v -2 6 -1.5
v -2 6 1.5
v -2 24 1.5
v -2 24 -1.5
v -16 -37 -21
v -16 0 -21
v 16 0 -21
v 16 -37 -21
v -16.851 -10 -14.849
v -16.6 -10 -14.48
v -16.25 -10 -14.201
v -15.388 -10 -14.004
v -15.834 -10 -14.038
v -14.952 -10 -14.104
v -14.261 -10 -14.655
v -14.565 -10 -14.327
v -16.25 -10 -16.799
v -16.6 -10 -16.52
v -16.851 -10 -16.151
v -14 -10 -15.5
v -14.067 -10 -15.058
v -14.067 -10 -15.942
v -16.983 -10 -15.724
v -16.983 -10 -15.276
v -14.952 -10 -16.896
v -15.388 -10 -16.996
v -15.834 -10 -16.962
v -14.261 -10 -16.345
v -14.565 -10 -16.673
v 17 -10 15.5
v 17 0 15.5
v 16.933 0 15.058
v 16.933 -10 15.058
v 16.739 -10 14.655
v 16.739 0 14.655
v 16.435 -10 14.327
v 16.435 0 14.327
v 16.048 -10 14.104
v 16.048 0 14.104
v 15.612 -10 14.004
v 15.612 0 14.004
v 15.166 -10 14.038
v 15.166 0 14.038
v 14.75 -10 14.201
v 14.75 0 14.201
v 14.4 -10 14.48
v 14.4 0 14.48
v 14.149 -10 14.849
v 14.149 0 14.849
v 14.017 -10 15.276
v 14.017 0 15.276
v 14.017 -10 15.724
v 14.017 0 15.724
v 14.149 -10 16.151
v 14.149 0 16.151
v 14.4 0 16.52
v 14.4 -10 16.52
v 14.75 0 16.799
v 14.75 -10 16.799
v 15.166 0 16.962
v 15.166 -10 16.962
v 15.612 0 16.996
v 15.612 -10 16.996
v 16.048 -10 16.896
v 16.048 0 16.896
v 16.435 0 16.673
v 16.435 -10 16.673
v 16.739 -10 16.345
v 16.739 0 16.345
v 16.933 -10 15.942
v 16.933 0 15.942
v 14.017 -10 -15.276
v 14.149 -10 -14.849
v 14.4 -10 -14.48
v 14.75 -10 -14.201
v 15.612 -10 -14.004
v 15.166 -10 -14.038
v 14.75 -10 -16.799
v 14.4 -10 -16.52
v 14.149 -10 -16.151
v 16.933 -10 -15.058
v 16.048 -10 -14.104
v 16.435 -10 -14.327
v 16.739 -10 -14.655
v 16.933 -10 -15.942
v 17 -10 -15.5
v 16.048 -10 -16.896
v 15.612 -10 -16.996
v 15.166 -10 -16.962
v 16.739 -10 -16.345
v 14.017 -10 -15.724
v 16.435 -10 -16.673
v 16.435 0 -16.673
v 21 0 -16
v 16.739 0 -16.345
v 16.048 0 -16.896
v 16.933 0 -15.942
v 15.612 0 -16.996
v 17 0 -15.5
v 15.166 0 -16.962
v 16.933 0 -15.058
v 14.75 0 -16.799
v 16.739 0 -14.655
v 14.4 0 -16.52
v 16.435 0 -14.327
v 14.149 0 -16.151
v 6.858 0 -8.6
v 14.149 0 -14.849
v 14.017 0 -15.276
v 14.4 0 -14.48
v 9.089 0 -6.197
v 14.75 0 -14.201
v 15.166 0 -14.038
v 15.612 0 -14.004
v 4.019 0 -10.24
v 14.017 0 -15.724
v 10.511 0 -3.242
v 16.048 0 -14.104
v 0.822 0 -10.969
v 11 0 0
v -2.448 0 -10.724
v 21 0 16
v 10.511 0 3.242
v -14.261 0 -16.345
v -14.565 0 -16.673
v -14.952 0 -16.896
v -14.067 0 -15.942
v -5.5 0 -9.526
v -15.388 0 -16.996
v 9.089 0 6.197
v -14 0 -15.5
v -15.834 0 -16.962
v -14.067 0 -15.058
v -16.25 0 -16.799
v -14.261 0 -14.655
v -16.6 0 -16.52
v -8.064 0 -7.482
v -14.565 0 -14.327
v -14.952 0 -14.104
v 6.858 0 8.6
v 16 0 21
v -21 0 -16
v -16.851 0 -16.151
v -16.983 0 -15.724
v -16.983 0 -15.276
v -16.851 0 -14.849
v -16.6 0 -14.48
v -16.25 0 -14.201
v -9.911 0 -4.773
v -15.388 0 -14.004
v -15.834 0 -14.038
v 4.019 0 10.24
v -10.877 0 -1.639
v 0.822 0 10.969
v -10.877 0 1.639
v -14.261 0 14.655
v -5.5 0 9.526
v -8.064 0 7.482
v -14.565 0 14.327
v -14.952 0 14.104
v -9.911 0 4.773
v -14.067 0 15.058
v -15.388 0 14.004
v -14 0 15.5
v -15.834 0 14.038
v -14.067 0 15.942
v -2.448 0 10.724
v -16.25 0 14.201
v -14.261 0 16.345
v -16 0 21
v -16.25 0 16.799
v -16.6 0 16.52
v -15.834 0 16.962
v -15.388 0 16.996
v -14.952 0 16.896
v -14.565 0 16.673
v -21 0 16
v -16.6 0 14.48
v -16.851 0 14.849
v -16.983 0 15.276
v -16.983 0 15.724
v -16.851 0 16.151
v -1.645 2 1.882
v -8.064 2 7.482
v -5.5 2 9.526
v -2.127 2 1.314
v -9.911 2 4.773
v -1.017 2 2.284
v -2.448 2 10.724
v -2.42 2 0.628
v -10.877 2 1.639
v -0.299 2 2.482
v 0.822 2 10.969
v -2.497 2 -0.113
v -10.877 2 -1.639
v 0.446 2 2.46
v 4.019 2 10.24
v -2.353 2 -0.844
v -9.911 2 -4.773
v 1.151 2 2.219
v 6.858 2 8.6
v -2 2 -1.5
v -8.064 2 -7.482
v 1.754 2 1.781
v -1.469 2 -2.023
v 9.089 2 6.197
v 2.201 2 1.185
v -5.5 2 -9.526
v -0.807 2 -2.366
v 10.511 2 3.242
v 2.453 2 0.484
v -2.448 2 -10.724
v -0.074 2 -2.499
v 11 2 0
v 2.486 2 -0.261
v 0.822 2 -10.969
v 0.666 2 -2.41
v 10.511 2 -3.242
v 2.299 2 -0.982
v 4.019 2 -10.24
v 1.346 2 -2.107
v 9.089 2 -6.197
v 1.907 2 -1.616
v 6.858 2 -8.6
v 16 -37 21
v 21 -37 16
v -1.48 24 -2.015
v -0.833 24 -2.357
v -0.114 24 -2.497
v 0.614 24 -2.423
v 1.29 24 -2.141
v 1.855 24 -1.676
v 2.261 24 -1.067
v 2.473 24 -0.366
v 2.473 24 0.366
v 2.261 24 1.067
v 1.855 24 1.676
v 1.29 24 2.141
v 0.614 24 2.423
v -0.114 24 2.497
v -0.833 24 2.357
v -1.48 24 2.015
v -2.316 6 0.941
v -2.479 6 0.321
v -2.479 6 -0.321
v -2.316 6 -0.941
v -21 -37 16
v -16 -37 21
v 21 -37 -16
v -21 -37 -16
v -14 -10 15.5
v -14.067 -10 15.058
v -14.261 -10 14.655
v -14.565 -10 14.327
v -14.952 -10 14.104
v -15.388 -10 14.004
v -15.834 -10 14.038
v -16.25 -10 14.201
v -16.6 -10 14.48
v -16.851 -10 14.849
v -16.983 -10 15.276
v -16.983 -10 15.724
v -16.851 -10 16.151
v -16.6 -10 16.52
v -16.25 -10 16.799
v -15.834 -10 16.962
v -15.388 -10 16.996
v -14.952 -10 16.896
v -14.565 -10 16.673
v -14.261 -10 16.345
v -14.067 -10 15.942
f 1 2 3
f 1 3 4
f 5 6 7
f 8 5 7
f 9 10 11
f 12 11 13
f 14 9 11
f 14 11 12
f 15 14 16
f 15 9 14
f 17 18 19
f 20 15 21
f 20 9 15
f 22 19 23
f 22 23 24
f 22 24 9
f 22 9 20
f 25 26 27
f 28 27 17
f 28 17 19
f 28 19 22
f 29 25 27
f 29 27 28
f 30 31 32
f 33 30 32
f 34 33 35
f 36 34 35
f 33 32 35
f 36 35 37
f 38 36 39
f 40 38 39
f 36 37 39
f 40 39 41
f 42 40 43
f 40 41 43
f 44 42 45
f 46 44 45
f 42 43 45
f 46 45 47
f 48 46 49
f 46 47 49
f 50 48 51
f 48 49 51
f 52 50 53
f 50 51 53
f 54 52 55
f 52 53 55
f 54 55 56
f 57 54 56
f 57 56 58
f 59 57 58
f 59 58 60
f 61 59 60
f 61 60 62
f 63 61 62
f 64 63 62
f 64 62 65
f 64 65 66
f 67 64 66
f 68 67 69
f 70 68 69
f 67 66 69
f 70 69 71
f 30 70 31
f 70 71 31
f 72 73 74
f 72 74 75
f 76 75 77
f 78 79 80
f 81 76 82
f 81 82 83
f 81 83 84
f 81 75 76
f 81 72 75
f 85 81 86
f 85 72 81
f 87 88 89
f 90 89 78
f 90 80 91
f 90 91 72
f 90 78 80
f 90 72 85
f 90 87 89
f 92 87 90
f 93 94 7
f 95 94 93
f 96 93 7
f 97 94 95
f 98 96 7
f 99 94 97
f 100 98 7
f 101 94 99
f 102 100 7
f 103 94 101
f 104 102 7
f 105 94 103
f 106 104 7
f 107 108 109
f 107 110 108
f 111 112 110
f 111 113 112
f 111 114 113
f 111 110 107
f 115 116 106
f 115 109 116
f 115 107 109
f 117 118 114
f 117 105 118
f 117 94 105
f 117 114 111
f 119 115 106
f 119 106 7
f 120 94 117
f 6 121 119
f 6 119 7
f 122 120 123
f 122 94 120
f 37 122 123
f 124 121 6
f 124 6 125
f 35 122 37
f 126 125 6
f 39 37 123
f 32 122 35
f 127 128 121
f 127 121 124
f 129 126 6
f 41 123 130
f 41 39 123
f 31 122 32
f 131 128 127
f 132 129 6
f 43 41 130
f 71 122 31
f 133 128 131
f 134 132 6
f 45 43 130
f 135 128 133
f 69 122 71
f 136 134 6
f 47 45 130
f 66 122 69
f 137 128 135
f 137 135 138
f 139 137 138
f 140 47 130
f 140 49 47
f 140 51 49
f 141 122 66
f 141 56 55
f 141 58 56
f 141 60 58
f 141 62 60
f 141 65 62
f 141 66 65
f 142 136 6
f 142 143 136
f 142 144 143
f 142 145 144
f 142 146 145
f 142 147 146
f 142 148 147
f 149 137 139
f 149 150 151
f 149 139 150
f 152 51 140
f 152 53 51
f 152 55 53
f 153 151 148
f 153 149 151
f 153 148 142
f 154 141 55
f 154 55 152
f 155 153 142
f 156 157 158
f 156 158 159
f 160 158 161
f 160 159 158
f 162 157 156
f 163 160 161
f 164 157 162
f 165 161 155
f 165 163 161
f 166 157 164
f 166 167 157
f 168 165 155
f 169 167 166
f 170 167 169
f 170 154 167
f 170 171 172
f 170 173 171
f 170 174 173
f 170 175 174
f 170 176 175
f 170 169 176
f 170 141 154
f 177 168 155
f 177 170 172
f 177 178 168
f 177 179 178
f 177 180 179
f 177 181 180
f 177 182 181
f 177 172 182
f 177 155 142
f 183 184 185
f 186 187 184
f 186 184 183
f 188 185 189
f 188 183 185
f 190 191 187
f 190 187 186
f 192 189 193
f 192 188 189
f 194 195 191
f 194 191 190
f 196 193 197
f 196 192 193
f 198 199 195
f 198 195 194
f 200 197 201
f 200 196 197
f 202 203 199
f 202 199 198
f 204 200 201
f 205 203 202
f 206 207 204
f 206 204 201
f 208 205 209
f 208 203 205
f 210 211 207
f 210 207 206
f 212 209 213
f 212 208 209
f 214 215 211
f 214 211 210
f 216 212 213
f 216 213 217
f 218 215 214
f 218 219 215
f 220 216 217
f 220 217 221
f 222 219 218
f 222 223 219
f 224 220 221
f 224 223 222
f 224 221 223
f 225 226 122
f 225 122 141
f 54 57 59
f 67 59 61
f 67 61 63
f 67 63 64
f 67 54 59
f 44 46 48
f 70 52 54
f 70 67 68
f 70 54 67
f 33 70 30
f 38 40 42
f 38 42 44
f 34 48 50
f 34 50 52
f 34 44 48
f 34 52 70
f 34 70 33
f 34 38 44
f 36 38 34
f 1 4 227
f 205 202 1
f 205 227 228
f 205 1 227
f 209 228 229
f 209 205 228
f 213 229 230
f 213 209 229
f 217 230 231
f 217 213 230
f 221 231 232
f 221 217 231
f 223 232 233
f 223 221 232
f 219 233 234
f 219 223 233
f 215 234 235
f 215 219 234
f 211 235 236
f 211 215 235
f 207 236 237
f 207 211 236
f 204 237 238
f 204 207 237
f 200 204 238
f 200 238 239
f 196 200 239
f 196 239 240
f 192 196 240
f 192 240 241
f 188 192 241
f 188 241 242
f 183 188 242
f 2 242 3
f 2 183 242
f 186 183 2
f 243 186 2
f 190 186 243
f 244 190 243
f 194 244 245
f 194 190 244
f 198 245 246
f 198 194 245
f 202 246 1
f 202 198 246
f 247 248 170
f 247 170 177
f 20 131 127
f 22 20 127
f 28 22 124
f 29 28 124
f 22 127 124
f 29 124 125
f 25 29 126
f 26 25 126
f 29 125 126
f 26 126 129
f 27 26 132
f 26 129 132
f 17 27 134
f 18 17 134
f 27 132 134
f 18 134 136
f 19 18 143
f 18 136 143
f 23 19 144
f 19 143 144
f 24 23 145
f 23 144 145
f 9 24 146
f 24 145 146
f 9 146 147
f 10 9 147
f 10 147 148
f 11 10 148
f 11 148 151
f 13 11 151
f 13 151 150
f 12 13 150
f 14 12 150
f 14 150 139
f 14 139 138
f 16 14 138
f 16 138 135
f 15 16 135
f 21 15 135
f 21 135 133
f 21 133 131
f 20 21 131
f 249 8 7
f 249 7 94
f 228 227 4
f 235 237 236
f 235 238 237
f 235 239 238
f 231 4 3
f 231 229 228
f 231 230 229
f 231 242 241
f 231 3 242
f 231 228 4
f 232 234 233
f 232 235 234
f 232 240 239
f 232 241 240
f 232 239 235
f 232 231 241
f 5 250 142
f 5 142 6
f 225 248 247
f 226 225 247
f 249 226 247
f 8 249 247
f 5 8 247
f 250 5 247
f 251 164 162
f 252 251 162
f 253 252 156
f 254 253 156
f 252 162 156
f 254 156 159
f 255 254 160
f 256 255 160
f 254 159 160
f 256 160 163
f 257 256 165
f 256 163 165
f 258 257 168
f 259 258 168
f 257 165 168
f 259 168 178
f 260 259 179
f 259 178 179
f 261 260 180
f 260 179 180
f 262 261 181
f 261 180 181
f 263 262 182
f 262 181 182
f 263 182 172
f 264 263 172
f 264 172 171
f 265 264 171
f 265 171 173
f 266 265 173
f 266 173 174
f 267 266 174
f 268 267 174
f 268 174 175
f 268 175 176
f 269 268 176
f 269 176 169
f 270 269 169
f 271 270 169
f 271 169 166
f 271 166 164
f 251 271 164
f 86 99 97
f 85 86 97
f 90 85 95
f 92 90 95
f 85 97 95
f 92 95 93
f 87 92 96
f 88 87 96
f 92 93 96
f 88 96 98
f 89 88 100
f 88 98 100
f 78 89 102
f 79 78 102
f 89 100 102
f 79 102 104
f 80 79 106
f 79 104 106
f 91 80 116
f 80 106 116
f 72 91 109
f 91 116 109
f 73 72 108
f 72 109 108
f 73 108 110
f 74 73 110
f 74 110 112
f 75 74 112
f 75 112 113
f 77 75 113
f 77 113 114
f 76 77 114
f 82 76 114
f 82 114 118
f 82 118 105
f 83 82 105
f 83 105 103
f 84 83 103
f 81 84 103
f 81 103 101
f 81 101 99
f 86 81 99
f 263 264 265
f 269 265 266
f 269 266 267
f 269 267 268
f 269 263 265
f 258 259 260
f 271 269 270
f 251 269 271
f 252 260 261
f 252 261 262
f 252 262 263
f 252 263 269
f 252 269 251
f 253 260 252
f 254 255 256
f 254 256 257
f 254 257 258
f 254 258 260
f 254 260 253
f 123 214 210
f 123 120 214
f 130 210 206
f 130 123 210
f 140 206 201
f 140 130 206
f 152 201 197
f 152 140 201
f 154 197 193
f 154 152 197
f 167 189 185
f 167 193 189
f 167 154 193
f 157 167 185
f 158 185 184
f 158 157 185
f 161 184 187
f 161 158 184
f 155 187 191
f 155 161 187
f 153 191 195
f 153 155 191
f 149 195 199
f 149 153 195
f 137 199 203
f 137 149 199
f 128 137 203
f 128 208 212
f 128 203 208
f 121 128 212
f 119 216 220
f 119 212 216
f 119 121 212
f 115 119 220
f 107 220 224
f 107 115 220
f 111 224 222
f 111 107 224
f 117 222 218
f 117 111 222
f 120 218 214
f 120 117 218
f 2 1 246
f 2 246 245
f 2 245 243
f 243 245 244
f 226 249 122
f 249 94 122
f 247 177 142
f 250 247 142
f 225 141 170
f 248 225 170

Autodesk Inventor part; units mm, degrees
ref_plane "YZ Plane" through (0, 0, 0) normal (1, 0, 0) x (0, 1, 0)
ref_plane "XZ Plane" through (0, 0, 0) normal (0, 1, 0) x (-1, 0, 0)
ref_plane "XY Plane" through (0, 0, 0) normal (0, 0, 1) x (1, 0, 0)
sketch "스케치1" plane through (0, 0, 0) normal (0, 1, 0) x (-1, 0, 0)
  line L0 (-16, 21) -> (16, 21)
  line L1 (21, 16) -> (21, -16)
  line L2 (16, -21) -> (-16, -21)
  line L3 (-21, -16) -> (-21, 16)
  line L4 (-21, 21) -> (21, -21) construction
  line L5 (21, 21) -> (-21, -21) construction
  line L6 (16, 21) -> (21, 16)
  line L7 (21, -16) -> (16, -21)
  line L8 (-16, -21) -> (-21, -16)
  line L9 (-21, 16) -> (-16, 21)
  point P0 (0, 0)
  dimension "d0" = 42
  dimension "d1" = 42
  dimension "d2" = 5
  dimension "d3" = 5
  dimension "d4" = 5
  dimension "d5" = 5
  dimension "d6" = 5
  dimension "d7" = 5
  dimension "d8" = 5
  dimension "d9" = 5
extrude "돌출1" add sketch "스케치1" against normal blind 37
sketch "스케치2" plane through (0, 0, 0) normal (0, 1, 0) x (1, 0, 0)
  circle A0 centre (-15.5, -15.5) radius 1.5
  line L0 (0, 0) -> (-5.5004, 0) construction
  line L1 (0, 0) -> (0, 5.7427) construction
  circle A1 centre (-15.5, 15.5) radius 1.5
  circle A2 centre (15.5, -15.5) radius 1.5
  circle A3 centre (15.5, 15.5) radius 1.5
  dimension "d12" = 3
  dimension "d13" = 31
  dimension "d14" = 31
extrude "돌출2" cut sketch "스케치2" against normal blind 10
sketch "스케치3" plane through (0, 0, 0) normal (0, 1, 0) x (1, 0, 0)
  circle A0 centre (0, 0) radius 11
  dimension "d17" = 22
extrude "돌출3" add sketch "스케치3" along normal blind 2
sketch "스케치4" plane through (0, 2, 0) normal (0, 1, 0) x (1, 0, 0)
  circle A0 centre (0, 0) radius 2.5
  line L0 (-2, -3.7589) -> (-2, 6.4181)
  point P0 (-2, 1.5)
  point P1 (-2, -1.5)
  dimension "d20" = 5
  dimension "d23" = 2
extrude "돌출4" add sketch "스케치4" along normal blind 22 contours A0 L0 picked at (-0.5259, 0.206)
sketch "스케치5" plane through (0, 2, 0) normal (0, 1, 0) x (1, 0, 0)
  arc A0 (-2, -1.5) -> (-2, 1.5) centre (0, 0) ccw projected
  circle A1 centre (0, 0) radius 2.5
extrude "돌출5" add sketch "스케치5" along normal blind 4
equation "\"d3\" = d2"
equation "\"d4\" = d2"
equation "\"d5\" = d4"
equation "\"d6\" = d2"
equation "\"d7\" = d6"
equation "\"d8\" = d2"
equation "\"d9\" = d8"
properties part number "스텝모터 4401"
